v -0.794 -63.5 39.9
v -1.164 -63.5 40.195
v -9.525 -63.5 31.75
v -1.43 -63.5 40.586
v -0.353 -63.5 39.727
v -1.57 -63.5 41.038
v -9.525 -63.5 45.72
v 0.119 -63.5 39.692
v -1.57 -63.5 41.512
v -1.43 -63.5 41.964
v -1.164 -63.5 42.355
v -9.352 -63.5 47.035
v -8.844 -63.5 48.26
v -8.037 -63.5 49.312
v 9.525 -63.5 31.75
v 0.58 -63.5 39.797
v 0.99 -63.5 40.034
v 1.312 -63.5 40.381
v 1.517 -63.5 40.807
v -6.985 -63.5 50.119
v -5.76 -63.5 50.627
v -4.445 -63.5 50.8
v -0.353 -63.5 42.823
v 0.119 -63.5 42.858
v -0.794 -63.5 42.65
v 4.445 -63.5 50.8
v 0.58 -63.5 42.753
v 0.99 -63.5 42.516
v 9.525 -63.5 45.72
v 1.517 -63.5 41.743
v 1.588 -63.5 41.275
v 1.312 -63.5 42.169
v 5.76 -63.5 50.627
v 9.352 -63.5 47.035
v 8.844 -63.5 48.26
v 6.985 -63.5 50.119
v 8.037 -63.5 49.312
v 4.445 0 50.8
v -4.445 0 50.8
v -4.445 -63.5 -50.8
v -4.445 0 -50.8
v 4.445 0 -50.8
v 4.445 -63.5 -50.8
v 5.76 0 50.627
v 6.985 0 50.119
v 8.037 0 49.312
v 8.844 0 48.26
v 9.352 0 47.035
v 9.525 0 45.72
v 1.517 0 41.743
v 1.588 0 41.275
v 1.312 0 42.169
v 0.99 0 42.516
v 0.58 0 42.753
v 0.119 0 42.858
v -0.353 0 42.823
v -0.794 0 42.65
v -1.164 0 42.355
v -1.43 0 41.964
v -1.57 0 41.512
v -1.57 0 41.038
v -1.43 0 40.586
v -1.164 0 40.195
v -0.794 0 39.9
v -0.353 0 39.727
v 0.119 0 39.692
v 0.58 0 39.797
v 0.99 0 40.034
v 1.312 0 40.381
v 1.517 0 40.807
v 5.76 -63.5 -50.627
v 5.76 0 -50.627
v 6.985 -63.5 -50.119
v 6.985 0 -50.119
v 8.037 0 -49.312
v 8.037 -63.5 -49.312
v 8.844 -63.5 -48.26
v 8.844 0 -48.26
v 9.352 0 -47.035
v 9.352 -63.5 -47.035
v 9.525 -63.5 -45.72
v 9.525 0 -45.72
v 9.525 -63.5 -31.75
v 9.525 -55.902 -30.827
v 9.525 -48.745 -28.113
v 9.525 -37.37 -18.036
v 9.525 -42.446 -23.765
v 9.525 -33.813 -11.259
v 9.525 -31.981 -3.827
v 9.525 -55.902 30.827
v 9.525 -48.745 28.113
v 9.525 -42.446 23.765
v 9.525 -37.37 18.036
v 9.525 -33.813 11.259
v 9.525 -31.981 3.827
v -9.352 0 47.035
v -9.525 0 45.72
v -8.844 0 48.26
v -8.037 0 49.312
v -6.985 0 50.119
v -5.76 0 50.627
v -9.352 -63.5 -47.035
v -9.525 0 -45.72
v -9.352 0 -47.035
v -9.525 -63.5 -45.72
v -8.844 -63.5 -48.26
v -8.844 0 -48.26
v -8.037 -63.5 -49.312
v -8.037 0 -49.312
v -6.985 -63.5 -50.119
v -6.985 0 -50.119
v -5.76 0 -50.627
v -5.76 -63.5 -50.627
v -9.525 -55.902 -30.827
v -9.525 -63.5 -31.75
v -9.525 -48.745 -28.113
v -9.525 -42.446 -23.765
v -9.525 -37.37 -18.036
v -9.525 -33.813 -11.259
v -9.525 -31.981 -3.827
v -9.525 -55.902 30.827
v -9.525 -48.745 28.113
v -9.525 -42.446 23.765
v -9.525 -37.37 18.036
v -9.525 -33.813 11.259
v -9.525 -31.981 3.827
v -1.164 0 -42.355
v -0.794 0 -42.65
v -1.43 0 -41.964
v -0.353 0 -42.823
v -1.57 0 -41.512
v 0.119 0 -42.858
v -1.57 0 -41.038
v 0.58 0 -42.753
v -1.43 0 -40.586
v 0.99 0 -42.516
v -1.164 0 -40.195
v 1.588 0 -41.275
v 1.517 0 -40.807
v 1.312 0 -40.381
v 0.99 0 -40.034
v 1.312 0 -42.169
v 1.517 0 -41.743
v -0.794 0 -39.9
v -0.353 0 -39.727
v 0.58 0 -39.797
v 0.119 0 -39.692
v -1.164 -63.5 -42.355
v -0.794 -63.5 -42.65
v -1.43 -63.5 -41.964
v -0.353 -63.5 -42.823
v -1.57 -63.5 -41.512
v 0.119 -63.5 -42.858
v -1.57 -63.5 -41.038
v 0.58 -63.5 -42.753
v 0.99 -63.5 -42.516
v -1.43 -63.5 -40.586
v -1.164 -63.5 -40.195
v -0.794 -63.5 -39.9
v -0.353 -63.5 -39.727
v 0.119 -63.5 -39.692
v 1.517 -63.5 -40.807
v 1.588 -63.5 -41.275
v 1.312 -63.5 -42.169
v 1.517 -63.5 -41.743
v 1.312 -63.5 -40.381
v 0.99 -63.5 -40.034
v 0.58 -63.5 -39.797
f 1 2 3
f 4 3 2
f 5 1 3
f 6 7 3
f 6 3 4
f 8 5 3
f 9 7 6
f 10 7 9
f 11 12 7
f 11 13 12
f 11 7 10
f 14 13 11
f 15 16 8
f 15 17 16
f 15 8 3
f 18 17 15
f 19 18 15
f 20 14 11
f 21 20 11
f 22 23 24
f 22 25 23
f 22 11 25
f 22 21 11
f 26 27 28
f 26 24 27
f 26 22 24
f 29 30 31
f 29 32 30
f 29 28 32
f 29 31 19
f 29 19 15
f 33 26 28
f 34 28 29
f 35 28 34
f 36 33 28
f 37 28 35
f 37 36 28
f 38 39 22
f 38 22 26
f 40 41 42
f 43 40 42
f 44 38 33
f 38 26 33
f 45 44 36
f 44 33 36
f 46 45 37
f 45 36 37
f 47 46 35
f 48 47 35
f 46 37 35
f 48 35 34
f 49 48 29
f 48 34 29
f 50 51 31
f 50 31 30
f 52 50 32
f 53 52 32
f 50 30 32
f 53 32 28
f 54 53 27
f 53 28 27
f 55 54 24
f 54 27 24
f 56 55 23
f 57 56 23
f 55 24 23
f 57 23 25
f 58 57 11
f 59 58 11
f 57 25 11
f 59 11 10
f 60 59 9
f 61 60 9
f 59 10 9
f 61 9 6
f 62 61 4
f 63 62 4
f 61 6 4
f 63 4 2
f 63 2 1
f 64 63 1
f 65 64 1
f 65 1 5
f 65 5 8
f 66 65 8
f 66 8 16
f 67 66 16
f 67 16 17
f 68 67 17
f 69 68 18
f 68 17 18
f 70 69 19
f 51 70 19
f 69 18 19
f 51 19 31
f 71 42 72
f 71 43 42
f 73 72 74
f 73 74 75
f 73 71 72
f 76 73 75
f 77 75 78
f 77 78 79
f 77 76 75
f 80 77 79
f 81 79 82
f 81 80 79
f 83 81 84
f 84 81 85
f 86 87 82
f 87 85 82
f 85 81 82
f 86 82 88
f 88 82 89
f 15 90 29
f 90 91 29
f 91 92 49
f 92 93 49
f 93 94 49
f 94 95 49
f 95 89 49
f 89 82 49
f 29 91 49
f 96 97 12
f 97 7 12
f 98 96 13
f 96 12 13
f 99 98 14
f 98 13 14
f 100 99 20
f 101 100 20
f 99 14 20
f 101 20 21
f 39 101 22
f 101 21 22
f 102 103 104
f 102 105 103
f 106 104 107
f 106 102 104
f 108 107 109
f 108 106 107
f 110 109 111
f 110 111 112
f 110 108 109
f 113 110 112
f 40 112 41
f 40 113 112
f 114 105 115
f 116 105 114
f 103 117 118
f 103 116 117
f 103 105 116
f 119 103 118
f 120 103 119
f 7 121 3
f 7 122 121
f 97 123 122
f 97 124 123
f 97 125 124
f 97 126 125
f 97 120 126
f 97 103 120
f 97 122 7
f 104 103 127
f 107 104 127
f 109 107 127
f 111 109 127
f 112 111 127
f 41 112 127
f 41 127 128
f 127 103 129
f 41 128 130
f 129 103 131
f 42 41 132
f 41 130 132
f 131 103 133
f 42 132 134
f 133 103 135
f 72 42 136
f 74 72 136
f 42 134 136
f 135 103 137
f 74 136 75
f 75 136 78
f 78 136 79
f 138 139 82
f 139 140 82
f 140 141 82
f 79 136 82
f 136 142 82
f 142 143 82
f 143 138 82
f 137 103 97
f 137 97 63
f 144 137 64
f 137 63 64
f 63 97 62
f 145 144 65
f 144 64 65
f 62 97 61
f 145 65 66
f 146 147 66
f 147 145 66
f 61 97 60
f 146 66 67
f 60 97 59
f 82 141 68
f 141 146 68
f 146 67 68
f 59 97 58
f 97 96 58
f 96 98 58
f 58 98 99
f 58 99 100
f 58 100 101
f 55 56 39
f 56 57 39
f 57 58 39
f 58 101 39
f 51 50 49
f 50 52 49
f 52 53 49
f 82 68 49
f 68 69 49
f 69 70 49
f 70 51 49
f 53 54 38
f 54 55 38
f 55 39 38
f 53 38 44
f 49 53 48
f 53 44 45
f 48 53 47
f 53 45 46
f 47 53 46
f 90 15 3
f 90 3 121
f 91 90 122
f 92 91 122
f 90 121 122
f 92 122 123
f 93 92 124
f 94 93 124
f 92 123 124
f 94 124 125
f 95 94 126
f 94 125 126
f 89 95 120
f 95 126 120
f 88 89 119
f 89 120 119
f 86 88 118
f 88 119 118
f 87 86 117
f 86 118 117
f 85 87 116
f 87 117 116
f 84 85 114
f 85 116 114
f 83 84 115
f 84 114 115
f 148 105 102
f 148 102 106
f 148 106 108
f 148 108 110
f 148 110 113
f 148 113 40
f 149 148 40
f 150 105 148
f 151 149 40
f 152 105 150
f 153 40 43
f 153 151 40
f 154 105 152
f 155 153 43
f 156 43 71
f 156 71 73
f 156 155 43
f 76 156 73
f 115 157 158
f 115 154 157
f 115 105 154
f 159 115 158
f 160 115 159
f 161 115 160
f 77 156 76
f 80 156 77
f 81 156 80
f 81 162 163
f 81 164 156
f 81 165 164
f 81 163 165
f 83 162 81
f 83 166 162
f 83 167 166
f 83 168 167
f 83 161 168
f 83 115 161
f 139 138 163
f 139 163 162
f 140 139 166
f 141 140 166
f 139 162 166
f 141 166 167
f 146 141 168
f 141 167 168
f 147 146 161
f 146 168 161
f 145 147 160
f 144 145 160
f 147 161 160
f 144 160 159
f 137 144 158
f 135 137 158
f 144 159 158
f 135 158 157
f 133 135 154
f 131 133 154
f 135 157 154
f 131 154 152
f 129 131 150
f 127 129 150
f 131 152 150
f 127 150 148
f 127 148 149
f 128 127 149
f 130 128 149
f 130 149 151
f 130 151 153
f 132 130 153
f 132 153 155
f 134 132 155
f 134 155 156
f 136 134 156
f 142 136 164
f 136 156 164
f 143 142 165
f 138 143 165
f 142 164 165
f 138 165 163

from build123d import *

# Parameters (mm, degrees)
F0_W     = 19.05
F0_H     = 101.6
F1_DEPTH = 63.5
F3_R     = 31.75
F4_DEPTH = 19.05
F6_R     = 1.5875
F7_DEPTH = 63.5
F8_R     = 5.08


with BuildPart() as f1:
    # F0 (on Front) → F1 (new body)
    with BuildSketch(Plane.XZ):
        Rectangle(F0_W, F0_H)
    extrude(amount=F1_DEPTH)

    # F3 (on offset) → F4 (cut)
    with BuildSketch(Plane(origin=(-9.525, 0, 0), x_dir=(0, -1, 0), z_dir=(-1, 0, 0))):
        with Locations((63.5, 0)):
            Circle(F3_R)
    extrude(amount=-F4_DEPTH, mode=Mode.SUBTRACT)

    # F6 (on offset) → F7 (cut)
    with BuildSketch(Plane.XZ.offset(63.5)):
        with Locations((0, 41.275)):
            Circle(F6_R)
        with Locations((0, -41.275)):
            Circle(F6_R)
    extrude(amount=-F7_DEPTH, mode=Mode.SUBTRACT)

    # F8
    f8_edges = [f1.edges().sort_by_distance(p)[0] for p in [
        (-9.525, -31.75, 50.8),
        (-9.525, -31.75, -50.8),
        (9.525, -31.75, -50.8),
        (9.525, -31.75, 50.8),
    ]]
    fillet(f8_edges, radius=F8_R)


solid = f1.part
